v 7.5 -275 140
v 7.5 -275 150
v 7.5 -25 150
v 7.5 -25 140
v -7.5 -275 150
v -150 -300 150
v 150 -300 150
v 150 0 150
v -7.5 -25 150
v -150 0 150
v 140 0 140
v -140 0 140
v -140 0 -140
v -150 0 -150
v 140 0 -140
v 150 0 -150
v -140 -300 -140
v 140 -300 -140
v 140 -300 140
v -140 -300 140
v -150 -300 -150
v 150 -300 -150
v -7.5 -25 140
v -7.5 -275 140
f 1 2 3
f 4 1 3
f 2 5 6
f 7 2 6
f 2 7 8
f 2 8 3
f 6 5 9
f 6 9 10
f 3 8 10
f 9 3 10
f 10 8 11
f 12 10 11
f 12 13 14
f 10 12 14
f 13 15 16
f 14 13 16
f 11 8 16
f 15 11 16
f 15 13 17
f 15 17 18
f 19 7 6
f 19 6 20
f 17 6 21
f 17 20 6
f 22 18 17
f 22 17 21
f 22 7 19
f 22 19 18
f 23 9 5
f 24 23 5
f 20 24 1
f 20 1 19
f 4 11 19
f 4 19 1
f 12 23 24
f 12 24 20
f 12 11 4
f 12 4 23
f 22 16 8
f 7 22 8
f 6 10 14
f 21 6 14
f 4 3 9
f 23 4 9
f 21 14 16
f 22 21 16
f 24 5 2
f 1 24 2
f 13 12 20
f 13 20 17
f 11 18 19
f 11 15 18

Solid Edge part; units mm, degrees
sketch "Sketch1" plane through (0, 0, 0) normal (0, -1, 0) x (1, 0, 0)
  line L0 (140, -140) -> (140, 140)
  line L1 (140, 140) -> (-140, 140)
  line L2 (-140, 140) -> (-140, -140)
  line L3 (-140, -140) -> (140, -140)
  line L4 (150, -150) -> (150, 150)
  line L5 (150, 150) -> (-150, 150)
  line L6 (-150, 150) -> (-150, -150)
  line L7 (-150, -150) -> (150, -150)
  dimension "D1" = 300
  dimension "D2" = 280
  dimension "D3" = 300
  dimension "D4" = 280
extrude "Protrusion1" add sketch "Sketch1" along normal blind 300
sketch "Sketch2" plane through (0, -150, 150) normal (0, 0, 1) x (1, 0, 0)
  line L0 (7.5, -125) -> (7.5, 125)
  line L1 (7.5, 125) -> (-7.5, 125)
  line L2 (-7.5, 125) -> (-7.5, -125)
  line L3 (-7.5, -125) -> (7.5, -125)
extrude "Cutout1" cut sketch "Sketch2" against normal up to next
